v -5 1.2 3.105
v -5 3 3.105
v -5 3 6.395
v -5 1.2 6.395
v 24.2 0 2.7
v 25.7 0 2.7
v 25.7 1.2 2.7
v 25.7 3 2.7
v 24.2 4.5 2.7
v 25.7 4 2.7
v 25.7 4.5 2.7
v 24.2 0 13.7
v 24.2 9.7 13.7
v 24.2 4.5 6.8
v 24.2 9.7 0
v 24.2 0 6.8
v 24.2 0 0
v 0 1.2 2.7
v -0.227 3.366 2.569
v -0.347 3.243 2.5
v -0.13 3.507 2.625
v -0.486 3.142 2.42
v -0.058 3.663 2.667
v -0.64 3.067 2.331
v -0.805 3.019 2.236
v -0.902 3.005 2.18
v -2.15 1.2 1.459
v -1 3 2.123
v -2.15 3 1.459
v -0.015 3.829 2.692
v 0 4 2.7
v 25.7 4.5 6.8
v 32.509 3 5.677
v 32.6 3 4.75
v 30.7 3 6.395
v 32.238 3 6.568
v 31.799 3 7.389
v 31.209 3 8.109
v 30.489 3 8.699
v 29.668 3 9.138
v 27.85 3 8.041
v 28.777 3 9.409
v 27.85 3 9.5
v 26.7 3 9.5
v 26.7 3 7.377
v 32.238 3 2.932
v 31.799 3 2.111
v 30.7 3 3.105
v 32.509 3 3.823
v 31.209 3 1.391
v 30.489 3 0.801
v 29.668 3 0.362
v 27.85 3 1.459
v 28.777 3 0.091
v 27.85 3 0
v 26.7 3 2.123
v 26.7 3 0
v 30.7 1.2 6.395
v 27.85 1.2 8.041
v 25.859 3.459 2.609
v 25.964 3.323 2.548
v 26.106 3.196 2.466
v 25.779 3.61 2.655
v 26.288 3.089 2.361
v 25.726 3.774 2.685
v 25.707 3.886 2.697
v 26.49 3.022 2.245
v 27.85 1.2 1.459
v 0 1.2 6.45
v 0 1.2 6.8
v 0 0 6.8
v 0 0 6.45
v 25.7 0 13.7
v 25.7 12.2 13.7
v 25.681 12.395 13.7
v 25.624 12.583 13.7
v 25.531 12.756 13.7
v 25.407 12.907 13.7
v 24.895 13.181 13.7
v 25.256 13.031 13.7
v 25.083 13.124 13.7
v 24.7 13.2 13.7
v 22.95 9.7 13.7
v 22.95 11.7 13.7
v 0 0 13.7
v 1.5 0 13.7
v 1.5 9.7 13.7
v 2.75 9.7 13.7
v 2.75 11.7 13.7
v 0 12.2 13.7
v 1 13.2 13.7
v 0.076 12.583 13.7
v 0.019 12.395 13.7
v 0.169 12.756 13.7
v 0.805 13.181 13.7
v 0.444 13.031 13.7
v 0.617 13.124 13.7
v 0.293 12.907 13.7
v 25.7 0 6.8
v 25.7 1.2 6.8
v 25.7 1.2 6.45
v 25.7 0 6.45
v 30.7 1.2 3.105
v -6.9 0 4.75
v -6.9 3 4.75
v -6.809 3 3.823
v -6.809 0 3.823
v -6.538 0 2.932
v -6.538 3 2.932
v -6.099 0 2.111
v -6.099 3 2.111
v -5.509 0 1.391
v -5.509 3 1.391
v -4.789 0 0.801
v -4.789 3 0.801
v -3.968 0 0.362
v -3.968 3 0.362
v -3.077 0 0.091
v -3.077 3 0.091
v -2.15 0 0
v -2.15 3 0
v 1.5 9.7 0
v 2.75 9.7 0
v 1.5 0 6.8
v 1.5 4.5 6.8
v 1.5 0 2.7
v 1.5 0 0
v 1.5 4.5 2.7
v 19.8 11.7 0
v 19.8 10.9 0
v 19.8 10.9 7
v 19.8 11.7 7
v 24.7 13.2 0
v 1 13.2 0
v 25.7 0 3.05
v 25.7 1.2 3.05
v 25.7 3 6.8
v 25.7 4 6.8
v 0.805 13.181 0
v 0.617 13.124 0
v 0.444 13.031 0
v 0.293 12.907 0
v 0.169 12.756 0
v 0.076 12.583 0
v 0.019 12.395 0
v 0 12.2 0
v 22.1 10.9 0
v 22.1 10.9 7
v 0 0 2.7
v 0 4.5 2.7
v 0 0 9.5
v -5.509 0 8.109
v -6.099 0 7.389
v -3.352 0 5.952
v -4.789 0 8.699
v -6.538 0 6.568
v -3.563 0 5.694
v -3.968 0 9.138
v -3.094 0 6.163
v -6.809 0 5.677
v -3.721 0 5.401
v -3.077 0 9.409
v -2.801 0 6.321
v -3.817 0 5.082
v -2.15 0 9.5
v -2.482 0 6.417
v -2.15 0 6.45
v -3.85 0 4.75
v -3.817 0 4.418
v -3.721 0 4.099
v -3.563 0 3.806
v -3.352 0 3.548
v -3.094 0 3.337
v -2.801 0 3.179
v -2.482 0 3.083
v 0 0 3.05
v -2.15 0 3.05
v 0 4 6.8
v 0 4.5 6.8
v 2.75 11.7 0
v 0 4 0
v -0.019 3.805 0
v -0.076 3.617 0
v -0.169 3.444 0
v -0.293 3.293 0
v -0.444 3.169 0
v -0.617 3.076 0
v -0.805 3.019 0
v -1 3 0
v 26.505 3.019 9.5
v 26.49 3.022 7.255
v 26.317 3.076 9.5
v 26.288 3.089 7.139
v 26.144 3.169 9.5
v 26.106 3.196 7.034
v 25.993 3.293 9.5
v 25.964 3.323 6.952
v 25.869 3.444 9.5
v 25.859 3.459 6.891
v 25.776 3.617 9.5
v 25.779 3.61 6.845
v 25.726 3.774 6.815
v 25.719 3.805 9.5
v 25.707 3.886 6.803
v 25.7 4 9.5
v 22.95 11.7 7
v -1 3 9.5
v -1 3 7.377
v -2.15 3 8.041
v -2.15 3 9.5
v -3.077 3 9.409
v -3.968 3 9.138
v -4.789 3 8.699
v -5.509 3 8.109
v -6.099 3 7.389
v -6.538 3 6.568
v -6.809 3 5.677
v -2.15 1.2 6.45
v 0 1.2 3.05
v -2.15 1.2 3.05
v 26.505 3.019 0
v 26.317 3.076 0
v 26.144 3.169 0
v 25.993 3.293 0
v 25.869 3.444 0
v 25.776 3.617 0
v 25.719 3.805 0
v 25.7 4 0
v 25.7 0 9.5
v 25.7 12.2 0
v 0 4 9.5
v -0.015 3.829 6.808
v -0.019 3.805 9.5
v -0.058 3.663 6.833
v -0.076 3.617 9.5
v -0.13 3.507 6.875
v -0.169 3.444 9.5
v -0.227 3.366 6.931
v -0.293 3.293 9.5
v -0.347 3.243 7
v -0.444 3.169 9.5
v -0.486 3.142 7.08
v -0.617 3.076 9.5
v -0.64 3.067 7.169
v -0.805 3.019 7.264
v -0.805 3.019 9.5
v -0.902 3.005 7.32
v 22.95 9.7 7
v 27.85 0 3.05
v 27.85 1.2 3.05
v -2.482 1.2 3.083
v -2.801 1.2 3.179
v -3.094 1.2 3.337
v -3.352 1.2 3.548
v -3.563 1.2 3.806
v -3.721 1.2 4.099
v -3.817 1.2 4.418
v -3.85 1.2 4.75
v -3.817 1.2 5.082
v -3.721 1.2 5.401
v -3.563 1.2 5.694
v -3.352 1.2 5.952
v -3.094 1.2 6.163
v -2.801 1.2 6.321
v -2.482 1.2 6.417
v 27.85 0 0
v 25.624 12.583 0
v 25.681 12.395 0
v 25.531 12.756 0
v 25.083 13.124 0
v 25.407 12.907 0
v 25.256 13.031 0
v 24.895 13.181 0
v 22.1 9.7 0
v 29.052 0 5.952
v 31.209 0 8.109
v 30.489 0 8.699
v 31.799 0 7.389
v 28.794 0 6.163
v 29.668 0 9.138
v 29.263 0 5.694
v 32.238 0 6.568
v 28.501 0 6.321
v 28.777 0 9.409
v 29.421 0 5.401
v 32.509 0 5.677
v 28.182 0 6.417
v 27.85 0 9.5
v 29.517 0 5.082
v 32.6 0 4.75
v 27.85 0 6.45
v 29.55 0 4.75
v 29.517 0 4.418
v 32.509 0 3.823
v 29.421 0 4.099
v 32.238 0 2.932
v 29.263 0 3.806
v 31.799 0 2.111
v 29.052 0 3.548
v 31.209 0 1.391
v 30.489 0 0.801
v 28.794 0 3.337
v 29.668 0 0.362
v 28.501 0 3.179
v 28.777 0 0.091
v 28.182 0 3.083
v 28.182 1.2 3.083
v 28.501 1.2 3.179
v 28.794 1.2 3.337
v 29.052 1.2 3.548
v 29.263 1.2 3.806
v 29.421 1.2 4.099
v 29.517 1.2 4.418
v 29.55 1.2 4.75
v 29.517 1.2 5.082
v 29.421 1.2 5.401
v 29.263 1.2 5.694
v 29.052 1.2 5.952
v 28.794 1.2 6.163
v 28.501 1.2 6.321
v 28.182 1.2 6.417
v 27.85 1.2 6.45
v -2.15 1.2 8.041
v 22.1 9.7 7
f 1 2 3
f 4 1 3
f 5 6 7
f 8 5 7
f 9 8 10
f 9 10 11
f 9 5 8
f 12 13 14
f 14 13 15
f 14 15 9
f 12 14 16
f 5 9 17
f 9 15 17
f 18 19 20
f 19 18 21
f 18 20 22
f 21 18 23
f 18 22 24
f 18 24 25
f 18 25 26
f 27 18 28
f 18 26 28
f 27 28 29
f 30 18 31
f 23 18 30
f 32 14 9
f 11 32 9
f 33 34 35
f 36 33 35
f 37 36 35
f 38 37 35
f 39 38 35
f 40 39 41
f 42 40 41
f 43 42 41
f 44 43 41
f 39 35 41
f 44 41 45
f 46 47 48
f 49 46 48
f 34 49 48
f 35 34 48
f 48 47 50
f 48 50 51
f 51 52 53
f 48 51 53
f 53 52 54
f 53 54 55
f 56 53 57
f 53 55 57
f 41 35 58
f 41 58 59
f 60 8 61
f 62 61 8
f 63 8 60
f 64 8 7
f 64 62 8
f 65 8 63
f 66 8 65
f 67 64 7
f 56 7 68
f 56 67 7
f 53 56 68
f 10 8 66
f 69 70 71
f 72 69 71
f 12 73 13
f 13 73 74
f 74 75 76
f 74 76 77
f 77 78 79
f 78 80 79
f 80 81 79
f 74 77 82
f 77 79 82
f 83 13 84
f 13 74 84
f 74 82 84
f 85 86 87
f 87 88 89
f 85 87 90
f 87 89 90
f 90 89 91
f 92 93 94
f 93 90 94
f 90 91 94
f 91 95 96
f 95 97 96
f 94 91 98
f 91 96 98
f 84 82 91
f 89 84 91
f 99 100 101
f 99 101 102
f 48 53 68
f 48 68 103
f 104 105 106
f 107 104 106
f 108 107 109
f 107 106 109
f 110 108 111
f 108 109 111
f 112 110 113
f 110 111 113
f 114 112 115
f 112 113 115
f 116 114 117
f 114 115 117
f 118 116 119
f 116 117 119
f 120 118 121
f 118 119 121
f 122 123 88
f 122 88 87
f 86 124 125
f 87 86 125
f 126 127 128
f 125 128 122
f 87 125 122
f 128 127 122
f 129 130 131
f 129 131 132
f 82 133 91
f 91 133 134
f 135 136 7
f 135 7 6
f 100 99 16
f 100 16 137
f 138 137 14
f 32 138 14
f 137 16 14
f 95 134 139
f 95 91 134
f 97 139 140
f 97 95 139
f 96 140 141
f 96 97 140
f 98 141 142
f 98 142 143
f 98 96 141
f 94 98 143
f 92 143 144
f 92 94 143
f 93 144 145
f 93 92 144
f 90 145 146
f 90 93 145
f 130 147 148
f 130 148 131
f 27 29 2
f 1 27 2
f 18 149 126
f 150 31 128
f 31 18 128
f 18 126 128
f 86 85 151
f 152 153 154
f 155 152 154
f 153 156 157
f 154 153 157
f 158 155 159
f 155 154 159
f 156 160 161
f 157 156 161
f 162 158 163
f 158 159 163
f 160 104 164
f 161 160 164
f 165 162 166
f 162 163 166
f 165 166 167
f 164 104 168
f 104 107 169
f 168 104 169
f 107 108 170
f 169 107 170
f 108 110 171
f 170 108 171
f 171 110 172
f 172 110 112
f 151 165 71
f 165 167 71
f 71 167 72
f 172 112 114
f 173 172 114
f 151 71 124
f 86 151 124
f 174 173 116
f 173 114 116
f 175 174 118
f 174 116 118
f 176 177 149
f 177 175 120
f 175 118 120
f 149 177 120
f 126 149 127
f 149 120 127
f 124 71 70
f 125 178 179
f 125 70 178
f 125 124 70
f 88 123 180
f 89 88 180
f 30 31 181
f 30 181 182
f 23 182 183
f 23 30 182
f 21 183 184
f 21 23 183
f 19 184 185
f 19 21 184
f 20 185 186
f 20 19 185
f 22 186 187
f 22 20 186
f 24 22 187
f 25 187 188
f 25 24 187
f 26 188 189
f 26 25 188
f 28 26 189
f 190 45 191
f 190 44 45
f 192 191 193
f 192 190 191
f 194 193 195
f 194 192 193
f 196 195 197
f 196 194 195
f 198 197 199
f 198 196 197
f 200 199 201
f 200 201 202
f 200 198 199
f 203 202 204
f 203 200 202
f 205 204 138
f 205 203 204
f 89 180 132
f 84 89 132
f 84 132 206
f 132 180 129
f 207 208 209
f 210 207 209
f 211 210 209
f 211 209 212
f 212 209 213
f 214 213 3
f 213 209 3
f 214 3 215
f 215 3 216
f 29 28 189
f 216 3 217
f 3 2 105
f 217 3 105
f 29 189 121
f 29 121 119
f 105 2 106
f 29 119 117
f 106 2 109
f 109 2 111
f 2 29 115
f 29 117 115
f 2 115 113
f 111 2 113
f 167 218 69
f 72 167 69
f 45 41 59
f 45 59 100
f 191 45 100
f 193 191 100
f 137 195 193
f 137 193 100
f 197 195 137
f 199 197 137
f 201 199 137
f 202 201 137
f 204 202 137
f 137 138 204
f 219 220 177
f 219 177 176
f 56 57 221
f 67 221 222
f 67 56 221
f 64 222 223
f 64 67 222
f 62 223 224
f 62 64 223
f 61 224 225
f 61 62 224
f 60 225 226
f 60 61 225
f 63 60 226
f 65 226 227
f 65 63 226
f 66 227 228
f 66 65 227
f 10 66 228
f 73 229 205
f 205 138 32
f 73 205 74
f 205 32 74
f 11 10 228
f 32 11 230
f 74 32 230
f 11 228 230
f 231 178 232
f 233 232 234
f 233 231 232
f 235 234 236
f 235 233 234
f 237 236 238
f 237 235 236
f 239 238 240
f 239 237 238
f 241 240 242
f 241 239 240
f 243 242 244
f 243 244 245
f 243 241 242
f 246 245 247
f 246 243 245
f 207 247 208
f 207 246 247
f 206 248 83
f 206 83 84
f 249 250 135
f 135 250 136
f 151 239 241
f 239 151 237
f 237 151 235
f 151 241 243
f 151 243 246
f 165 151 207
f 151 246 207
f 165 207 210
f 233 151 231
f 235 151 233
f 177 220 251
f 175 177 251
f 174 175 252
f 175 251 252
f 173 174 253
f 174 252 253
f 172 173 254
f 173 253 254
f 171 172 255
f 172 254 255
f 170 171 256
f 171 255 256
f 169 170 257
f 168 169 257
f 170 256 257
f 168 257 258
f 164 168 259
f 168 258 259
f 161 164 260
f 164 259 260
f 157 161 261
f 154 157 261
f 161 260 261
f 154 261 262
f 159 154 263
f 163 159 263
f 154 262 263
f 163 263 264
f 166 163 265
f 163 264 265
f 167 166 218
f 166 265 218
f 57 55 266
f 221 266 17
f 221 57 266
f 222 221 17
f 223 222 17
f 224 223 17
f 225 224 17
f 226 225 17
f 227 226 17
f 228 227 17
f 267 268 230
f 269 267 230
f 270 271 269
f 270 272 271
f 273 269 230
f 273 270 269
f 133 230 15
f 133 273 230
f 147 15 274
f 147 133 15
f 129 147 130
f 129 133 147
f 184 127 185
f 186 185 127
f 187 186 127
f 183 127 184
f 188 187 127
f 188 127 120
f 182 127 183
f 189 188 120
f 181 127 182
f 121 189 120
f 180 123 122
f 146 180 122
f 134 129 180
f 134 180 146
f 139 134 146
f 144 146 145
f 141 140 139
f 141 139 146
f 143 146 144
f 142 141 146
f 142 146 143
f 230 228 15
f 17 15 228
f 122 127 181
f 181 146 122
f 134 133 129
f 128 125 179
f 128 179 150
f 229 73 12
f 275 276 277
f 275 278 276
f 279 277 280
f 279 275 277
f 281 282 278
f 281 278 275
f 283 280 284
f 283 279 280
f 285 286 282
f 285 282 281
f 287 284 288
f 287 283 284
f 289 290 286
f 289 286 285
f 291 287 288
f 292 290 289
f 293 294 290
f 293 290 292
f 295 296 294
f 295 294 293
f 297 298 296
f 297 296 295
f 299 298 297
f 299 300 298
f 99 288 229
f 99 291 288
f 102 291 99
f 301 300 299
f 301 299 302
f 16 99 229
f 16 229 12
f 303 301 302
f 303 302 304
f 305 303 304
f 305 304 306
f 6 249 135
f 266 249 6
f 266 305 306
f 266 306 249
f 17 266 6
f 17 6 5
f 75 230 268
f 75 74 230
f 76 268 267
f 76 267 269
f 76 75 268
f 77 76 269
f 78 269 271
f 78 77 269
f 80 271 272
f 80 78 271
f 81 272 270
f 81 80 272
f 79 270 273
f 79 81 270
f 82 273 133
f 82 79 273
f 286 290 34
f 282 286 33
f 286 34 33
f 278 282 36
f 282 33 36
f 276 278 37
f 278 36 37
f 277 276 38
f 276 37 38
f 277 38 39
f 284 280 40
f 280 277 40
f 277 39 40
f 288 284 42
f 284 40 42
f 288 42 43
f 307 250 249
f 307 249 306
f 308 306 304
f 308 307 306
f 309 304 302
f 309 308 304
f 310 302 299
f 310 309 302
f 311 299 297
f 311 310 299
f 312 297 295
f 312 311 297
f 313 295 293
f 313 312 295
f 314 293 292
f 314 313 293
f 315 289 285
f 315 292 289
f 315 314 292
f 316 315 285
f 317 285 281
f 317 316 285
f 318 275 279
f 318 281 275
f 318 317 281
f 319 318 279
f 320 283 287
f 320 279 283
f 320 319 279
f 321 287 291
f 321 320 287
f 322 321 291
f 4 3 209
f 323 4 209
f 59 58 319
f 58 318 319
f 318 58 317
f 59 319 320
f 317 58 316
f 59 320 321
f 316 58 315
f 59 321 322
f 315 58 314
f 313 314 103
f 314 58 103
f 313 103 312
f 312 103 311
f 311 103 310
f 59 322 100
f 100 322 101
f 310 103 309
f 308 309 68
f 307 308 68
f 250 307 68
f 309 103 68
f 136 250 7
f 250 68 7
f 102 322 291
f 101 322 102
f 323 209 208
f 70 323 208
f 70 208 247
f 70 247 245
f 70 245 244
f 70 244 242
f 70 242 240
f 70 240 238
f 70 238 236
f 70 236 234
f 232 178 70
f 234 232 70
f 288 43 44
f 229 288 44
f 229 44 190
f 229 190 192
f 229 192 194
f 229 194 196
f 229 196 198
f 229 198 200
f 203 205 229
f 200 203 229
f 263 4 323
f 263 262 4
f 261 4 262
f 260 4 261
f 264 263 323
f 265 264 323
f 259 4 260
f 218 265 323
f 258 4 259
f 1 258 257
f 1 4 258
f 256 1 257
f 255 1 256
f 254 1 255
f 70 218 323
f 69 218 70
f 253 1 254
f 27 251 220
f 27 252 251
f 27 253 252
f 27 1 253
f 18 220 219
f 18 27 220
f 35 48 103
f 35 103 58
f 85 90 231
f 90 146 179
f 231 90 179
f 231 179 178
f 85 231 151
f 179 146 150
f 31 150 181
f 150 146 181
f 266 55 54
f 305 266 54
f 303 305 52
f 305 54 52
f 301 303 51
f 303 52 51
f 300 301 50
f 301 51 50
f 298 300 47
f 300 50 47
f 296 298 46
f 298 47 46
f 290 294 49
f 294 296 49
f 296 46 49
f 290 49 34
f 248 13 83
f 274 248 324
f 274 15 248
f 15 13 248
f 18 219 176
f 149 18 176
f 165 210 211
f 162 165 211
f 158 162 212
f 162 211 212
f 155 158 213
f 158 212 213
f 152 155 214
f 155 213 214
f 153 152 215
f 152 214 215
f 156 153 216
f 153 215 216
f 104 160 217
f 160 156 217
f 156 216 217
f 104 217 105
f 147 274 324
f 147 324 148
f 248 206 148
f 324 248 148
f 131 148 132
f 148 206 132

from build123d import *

# Parameters (mm, degrees)
BOSS_EXTRUDE1_DEPTH = 13.7
SKETCH3_W           = 6.9
SKETCH3_H           = 3
BOSS_EXTRUDE2_DEPTH = 9.5
SKETCH4_W           = 1.25
SKETCH4_H           = 2
BOSS_EXTRUDE3_DEPTH = 13.7
BOSS_EXTRUDE4_DEPTH = 7
CUT_EXTRUDE1_DEPTH  = 37.803396582
SKETCH7_W           = 2.15
SKETCH7_H           = 3.4
CUT_EXTRUDE2_DEPTH  = 37.803396582
CUT_EXTRUDE3_DEPTH  = 1.8
CUT_EXTRUDE4_REACH  = 38.457
SKETCH9_W           = 4.099186912
SKETCH9_H           = 4.5
FILLET1_R           = 1
FILLET2_R           = 1


with BuildPart() as part:
    # Sketch2 → Boss-Extrude1 (new body)
    with BuildSketch(Plane.XY):
        Polygon((0, 13.2), (0, 0), (1.5, 0), (1.5, 11.7), (24.2, 11.7), (24.2, 0), (25.7, 0), (25.7, 13.2), align=None)
    extrude(amount=BOSS_EXTRUDE1_DEPTH)

    # Sketch3 → Boss-Extrude2 (add)
    with BuildSketch(Plane(origin=(0, 0, 0), x_dir=(-1, 0, 0), z_dir=(0, 0, -1))):
        with Locations((-29.15, 1.5)):
            Rectangle(SKETCH3_W, SKETCH3_H)
        with Locations((3.45, 1.5)):
            Rectangle(SKETCH3_W, SKETCH3_H)
    extrude(amount=-BOSS_EXTRUDE2_DEPTH)

    # Sketch4 → Boss-Extrude3 (add)
    with BuildSketch(Plane(origin=(0, 0, 0), x_dir=(-1, 0, 0), z_dir=(0, 0, -1))):
        with Locations((-23.575, 10.7)):
            Rectangle(SKETCH4_W, SKETCH4_H)
        with Locations((-2.125, 10.7)):
            Rectangle(SKETCH4_W, SKETCH4_H)
    extrude(amount=-BOSS_EXTRUDE3_DEPTH)

    # Sketch5 → Boss-Extrude4 (add)
    with BuildSketch(Plane(origin=(0, 0, 0), x_dir=(-1, 0, 0), z_dir=(0, 0, -1))):
        Polygon((-22.95, 11.7), (-22.95, 9.7), (-22.1, 9.7), (-22.1, 10.9), (-19.8, 10.9), (-19.8, 11.7), align=None)
    extrude(amount=-BOSS_EXTRUDE4_DEPTH)

    # Sketch6 → Cut-Extrude1 (cut, through all)
    with BuildSketch(Plane(origin=(0, 3, 0), x_dir=(1, 0, 0), z_dir=(0, 1, 0))):
        with BuildLine():
            Line((32.6, -9.5), (32.6, -4.75))
            ThreePointArc((32.6, -4.75), (31.208757211, -8.108757211), (27.85, -9.5))
            Line((27.85, -9.5), (32.6, -9.5))
        make_face()
        with BuildLine():
            Line((32.6, -4.75), (32.6, 0))
            Line((32.6, 0), (27.85, 0))
            ThreePointArc((27.85, 0), (31.208757211, -1.391242789), (32.6, -4.75))
        make_face()
        with BuildLine():
            Line((-2.15, 0), (-6.9, 0))
            Line((-6.9, 0), (-6.9, -4.75))
            ThreePointArc((-6.9, -4.75), (-5.508757211, -1.391242789), (-2.15, 0))
        make_face()
        with BuildLine():
            ThreePointArc((-2.15, -9.5), (-5.508757211, -8.108757211), (-6.9, -4.75))
            Line((-6.9, -4.75), (-6.9, -9.5))
            Line((-6.9, -9.5), (-2.15, -9.5))
        make_face()
    extrude(amount=-CUT_EXTRUDE1_DEPTH, mode=Mode.SUBTRACT)

    # Sketch7 → Cut-Extrude2 (cut, through all)
    with BuildSketch(Plane(origin=(0, 3, 0), x_dir=(1, 0, 0), z_dir=(0, 1, 0))):
        with Locations((-1.075, -4.75)):
            Rectangle(SKETCH7_W, SKETCH7_H)
        with BuildLine():
            Line((-2.15, -6.45), (-2.15, -3.05))
            ThreePointArc((-2.15, -3.05), (-3.85, -4.75), (-2.15, -6.45))
        make_face()
    cut_extrude2 = extrude(amount=-CUT_EXTRUDE2_DEPTH, mode=Mode.SUBTRACT)

    # Sketch8 → Cut-Extrude3 (cut)
    with BuildSketch(Plane(origin=(0, 3, 0), x_dir=(1, 0, 0), z_dir=(0, 1, 0))):
        Polygon((-2.15, -8.040896534), (0.7, -6.395448267), (0.7, -3.104551733), (-2.15, -1.459103466), (-5, -3.104551733), (-5, -6.395448267), align=None)
        Polygon((30.7, -6.395448267), (27.85, -8.040896534), (25, -6.395448267), (25, -3.104551733), (27.85, -1.459103466), (30.7, -3.104551733), align=None)
    cut_extrude3 = extrude(amount=-CUT_EXTRUDE3_DEPTH, mode=Mode.SUBTRACT)

    # Cut-Extrude4: up to this face of the body (flat: up to its plane)
    cut_extrude4_end = Plane(part.part.faces().sort_by_distance((0, 7.554115794, 7.242871209))[0])
    # Sketch9 → Cut-Extrude4 (cut, up to the picked face)
    with BuildSketch(Plane(origin=(1.5, 0, 0), x_dir=(0, 0, -1), z_dir=(1, 0, 0)), mode=Mode.PRIVATE) as cut_extrude4_sk1:
        with Locations((-4.75, 2.25)):
            Rectangle(SKETCH9_W, SKETCH9_H)
    cut_extrude4_tool1 = split(extrude(cut_extrude4_sk1.sketch, amount=-CUT_EXTRUDE4_REACH, mode=Mode.PRIVATE), bisect_by=cut_extrude4_end, keep=Keep.BOTH, mode=Mode.PRIVATE)
    cut_extrude4 = cut_extrude4_tool1.solids().sort_by(Axis((1.5, 2.25, 4.75), (-1, 0, 0)))[0]
    add(cut_extrude4, mode=Mode.SUBTRACT)

    # Fillet1
    fillet1_edges = [part.edges().sort_by_distance(p)[0] for p in [
        (0, 3, 1.350203272),
        (25.7, 3, 1.350203272),
        (25.7, 3, 8.149796728),
        (0, 3, 8.149796728),
    ]]
    fillet(fillet1_edges, radius=FILLET1_R)

    # Mirror1: Cut-Extrude2, Cut-Extrude3, Cut-Extrude4 across plane
    add(cut_extrude2.mirror(Plane(origin=(12.85, 0, 0), x_dir=(0, 0, 1), z_dir=(1, 0, 0))), mode=Mode.SUBTRACT)
    add(cut_extrude3.mirror(Plane(origin=(12.85, 0, 0), x_dir=(0, 0, 1), z_dir=(1, 0, 0))), mode=Mode.SUBTRACT)
    add(cut_extrude4.mirror(Plane(origin=(12.85, 0, 0), x_dir=(0, 0, 1), z_dir=(1, 0, 0))), mode=Mode.SUBTRACT)

    # Fillet2
    fillet2_edges = [part.edges().sort_by_distance(p)[0] for p in [
        (0, 13.2, 6.85),
        (25.7, 13.2, 6.85),
    ]]
    fillet(fillet2_edges, radius=FILLET2_R)


solid = part.part
